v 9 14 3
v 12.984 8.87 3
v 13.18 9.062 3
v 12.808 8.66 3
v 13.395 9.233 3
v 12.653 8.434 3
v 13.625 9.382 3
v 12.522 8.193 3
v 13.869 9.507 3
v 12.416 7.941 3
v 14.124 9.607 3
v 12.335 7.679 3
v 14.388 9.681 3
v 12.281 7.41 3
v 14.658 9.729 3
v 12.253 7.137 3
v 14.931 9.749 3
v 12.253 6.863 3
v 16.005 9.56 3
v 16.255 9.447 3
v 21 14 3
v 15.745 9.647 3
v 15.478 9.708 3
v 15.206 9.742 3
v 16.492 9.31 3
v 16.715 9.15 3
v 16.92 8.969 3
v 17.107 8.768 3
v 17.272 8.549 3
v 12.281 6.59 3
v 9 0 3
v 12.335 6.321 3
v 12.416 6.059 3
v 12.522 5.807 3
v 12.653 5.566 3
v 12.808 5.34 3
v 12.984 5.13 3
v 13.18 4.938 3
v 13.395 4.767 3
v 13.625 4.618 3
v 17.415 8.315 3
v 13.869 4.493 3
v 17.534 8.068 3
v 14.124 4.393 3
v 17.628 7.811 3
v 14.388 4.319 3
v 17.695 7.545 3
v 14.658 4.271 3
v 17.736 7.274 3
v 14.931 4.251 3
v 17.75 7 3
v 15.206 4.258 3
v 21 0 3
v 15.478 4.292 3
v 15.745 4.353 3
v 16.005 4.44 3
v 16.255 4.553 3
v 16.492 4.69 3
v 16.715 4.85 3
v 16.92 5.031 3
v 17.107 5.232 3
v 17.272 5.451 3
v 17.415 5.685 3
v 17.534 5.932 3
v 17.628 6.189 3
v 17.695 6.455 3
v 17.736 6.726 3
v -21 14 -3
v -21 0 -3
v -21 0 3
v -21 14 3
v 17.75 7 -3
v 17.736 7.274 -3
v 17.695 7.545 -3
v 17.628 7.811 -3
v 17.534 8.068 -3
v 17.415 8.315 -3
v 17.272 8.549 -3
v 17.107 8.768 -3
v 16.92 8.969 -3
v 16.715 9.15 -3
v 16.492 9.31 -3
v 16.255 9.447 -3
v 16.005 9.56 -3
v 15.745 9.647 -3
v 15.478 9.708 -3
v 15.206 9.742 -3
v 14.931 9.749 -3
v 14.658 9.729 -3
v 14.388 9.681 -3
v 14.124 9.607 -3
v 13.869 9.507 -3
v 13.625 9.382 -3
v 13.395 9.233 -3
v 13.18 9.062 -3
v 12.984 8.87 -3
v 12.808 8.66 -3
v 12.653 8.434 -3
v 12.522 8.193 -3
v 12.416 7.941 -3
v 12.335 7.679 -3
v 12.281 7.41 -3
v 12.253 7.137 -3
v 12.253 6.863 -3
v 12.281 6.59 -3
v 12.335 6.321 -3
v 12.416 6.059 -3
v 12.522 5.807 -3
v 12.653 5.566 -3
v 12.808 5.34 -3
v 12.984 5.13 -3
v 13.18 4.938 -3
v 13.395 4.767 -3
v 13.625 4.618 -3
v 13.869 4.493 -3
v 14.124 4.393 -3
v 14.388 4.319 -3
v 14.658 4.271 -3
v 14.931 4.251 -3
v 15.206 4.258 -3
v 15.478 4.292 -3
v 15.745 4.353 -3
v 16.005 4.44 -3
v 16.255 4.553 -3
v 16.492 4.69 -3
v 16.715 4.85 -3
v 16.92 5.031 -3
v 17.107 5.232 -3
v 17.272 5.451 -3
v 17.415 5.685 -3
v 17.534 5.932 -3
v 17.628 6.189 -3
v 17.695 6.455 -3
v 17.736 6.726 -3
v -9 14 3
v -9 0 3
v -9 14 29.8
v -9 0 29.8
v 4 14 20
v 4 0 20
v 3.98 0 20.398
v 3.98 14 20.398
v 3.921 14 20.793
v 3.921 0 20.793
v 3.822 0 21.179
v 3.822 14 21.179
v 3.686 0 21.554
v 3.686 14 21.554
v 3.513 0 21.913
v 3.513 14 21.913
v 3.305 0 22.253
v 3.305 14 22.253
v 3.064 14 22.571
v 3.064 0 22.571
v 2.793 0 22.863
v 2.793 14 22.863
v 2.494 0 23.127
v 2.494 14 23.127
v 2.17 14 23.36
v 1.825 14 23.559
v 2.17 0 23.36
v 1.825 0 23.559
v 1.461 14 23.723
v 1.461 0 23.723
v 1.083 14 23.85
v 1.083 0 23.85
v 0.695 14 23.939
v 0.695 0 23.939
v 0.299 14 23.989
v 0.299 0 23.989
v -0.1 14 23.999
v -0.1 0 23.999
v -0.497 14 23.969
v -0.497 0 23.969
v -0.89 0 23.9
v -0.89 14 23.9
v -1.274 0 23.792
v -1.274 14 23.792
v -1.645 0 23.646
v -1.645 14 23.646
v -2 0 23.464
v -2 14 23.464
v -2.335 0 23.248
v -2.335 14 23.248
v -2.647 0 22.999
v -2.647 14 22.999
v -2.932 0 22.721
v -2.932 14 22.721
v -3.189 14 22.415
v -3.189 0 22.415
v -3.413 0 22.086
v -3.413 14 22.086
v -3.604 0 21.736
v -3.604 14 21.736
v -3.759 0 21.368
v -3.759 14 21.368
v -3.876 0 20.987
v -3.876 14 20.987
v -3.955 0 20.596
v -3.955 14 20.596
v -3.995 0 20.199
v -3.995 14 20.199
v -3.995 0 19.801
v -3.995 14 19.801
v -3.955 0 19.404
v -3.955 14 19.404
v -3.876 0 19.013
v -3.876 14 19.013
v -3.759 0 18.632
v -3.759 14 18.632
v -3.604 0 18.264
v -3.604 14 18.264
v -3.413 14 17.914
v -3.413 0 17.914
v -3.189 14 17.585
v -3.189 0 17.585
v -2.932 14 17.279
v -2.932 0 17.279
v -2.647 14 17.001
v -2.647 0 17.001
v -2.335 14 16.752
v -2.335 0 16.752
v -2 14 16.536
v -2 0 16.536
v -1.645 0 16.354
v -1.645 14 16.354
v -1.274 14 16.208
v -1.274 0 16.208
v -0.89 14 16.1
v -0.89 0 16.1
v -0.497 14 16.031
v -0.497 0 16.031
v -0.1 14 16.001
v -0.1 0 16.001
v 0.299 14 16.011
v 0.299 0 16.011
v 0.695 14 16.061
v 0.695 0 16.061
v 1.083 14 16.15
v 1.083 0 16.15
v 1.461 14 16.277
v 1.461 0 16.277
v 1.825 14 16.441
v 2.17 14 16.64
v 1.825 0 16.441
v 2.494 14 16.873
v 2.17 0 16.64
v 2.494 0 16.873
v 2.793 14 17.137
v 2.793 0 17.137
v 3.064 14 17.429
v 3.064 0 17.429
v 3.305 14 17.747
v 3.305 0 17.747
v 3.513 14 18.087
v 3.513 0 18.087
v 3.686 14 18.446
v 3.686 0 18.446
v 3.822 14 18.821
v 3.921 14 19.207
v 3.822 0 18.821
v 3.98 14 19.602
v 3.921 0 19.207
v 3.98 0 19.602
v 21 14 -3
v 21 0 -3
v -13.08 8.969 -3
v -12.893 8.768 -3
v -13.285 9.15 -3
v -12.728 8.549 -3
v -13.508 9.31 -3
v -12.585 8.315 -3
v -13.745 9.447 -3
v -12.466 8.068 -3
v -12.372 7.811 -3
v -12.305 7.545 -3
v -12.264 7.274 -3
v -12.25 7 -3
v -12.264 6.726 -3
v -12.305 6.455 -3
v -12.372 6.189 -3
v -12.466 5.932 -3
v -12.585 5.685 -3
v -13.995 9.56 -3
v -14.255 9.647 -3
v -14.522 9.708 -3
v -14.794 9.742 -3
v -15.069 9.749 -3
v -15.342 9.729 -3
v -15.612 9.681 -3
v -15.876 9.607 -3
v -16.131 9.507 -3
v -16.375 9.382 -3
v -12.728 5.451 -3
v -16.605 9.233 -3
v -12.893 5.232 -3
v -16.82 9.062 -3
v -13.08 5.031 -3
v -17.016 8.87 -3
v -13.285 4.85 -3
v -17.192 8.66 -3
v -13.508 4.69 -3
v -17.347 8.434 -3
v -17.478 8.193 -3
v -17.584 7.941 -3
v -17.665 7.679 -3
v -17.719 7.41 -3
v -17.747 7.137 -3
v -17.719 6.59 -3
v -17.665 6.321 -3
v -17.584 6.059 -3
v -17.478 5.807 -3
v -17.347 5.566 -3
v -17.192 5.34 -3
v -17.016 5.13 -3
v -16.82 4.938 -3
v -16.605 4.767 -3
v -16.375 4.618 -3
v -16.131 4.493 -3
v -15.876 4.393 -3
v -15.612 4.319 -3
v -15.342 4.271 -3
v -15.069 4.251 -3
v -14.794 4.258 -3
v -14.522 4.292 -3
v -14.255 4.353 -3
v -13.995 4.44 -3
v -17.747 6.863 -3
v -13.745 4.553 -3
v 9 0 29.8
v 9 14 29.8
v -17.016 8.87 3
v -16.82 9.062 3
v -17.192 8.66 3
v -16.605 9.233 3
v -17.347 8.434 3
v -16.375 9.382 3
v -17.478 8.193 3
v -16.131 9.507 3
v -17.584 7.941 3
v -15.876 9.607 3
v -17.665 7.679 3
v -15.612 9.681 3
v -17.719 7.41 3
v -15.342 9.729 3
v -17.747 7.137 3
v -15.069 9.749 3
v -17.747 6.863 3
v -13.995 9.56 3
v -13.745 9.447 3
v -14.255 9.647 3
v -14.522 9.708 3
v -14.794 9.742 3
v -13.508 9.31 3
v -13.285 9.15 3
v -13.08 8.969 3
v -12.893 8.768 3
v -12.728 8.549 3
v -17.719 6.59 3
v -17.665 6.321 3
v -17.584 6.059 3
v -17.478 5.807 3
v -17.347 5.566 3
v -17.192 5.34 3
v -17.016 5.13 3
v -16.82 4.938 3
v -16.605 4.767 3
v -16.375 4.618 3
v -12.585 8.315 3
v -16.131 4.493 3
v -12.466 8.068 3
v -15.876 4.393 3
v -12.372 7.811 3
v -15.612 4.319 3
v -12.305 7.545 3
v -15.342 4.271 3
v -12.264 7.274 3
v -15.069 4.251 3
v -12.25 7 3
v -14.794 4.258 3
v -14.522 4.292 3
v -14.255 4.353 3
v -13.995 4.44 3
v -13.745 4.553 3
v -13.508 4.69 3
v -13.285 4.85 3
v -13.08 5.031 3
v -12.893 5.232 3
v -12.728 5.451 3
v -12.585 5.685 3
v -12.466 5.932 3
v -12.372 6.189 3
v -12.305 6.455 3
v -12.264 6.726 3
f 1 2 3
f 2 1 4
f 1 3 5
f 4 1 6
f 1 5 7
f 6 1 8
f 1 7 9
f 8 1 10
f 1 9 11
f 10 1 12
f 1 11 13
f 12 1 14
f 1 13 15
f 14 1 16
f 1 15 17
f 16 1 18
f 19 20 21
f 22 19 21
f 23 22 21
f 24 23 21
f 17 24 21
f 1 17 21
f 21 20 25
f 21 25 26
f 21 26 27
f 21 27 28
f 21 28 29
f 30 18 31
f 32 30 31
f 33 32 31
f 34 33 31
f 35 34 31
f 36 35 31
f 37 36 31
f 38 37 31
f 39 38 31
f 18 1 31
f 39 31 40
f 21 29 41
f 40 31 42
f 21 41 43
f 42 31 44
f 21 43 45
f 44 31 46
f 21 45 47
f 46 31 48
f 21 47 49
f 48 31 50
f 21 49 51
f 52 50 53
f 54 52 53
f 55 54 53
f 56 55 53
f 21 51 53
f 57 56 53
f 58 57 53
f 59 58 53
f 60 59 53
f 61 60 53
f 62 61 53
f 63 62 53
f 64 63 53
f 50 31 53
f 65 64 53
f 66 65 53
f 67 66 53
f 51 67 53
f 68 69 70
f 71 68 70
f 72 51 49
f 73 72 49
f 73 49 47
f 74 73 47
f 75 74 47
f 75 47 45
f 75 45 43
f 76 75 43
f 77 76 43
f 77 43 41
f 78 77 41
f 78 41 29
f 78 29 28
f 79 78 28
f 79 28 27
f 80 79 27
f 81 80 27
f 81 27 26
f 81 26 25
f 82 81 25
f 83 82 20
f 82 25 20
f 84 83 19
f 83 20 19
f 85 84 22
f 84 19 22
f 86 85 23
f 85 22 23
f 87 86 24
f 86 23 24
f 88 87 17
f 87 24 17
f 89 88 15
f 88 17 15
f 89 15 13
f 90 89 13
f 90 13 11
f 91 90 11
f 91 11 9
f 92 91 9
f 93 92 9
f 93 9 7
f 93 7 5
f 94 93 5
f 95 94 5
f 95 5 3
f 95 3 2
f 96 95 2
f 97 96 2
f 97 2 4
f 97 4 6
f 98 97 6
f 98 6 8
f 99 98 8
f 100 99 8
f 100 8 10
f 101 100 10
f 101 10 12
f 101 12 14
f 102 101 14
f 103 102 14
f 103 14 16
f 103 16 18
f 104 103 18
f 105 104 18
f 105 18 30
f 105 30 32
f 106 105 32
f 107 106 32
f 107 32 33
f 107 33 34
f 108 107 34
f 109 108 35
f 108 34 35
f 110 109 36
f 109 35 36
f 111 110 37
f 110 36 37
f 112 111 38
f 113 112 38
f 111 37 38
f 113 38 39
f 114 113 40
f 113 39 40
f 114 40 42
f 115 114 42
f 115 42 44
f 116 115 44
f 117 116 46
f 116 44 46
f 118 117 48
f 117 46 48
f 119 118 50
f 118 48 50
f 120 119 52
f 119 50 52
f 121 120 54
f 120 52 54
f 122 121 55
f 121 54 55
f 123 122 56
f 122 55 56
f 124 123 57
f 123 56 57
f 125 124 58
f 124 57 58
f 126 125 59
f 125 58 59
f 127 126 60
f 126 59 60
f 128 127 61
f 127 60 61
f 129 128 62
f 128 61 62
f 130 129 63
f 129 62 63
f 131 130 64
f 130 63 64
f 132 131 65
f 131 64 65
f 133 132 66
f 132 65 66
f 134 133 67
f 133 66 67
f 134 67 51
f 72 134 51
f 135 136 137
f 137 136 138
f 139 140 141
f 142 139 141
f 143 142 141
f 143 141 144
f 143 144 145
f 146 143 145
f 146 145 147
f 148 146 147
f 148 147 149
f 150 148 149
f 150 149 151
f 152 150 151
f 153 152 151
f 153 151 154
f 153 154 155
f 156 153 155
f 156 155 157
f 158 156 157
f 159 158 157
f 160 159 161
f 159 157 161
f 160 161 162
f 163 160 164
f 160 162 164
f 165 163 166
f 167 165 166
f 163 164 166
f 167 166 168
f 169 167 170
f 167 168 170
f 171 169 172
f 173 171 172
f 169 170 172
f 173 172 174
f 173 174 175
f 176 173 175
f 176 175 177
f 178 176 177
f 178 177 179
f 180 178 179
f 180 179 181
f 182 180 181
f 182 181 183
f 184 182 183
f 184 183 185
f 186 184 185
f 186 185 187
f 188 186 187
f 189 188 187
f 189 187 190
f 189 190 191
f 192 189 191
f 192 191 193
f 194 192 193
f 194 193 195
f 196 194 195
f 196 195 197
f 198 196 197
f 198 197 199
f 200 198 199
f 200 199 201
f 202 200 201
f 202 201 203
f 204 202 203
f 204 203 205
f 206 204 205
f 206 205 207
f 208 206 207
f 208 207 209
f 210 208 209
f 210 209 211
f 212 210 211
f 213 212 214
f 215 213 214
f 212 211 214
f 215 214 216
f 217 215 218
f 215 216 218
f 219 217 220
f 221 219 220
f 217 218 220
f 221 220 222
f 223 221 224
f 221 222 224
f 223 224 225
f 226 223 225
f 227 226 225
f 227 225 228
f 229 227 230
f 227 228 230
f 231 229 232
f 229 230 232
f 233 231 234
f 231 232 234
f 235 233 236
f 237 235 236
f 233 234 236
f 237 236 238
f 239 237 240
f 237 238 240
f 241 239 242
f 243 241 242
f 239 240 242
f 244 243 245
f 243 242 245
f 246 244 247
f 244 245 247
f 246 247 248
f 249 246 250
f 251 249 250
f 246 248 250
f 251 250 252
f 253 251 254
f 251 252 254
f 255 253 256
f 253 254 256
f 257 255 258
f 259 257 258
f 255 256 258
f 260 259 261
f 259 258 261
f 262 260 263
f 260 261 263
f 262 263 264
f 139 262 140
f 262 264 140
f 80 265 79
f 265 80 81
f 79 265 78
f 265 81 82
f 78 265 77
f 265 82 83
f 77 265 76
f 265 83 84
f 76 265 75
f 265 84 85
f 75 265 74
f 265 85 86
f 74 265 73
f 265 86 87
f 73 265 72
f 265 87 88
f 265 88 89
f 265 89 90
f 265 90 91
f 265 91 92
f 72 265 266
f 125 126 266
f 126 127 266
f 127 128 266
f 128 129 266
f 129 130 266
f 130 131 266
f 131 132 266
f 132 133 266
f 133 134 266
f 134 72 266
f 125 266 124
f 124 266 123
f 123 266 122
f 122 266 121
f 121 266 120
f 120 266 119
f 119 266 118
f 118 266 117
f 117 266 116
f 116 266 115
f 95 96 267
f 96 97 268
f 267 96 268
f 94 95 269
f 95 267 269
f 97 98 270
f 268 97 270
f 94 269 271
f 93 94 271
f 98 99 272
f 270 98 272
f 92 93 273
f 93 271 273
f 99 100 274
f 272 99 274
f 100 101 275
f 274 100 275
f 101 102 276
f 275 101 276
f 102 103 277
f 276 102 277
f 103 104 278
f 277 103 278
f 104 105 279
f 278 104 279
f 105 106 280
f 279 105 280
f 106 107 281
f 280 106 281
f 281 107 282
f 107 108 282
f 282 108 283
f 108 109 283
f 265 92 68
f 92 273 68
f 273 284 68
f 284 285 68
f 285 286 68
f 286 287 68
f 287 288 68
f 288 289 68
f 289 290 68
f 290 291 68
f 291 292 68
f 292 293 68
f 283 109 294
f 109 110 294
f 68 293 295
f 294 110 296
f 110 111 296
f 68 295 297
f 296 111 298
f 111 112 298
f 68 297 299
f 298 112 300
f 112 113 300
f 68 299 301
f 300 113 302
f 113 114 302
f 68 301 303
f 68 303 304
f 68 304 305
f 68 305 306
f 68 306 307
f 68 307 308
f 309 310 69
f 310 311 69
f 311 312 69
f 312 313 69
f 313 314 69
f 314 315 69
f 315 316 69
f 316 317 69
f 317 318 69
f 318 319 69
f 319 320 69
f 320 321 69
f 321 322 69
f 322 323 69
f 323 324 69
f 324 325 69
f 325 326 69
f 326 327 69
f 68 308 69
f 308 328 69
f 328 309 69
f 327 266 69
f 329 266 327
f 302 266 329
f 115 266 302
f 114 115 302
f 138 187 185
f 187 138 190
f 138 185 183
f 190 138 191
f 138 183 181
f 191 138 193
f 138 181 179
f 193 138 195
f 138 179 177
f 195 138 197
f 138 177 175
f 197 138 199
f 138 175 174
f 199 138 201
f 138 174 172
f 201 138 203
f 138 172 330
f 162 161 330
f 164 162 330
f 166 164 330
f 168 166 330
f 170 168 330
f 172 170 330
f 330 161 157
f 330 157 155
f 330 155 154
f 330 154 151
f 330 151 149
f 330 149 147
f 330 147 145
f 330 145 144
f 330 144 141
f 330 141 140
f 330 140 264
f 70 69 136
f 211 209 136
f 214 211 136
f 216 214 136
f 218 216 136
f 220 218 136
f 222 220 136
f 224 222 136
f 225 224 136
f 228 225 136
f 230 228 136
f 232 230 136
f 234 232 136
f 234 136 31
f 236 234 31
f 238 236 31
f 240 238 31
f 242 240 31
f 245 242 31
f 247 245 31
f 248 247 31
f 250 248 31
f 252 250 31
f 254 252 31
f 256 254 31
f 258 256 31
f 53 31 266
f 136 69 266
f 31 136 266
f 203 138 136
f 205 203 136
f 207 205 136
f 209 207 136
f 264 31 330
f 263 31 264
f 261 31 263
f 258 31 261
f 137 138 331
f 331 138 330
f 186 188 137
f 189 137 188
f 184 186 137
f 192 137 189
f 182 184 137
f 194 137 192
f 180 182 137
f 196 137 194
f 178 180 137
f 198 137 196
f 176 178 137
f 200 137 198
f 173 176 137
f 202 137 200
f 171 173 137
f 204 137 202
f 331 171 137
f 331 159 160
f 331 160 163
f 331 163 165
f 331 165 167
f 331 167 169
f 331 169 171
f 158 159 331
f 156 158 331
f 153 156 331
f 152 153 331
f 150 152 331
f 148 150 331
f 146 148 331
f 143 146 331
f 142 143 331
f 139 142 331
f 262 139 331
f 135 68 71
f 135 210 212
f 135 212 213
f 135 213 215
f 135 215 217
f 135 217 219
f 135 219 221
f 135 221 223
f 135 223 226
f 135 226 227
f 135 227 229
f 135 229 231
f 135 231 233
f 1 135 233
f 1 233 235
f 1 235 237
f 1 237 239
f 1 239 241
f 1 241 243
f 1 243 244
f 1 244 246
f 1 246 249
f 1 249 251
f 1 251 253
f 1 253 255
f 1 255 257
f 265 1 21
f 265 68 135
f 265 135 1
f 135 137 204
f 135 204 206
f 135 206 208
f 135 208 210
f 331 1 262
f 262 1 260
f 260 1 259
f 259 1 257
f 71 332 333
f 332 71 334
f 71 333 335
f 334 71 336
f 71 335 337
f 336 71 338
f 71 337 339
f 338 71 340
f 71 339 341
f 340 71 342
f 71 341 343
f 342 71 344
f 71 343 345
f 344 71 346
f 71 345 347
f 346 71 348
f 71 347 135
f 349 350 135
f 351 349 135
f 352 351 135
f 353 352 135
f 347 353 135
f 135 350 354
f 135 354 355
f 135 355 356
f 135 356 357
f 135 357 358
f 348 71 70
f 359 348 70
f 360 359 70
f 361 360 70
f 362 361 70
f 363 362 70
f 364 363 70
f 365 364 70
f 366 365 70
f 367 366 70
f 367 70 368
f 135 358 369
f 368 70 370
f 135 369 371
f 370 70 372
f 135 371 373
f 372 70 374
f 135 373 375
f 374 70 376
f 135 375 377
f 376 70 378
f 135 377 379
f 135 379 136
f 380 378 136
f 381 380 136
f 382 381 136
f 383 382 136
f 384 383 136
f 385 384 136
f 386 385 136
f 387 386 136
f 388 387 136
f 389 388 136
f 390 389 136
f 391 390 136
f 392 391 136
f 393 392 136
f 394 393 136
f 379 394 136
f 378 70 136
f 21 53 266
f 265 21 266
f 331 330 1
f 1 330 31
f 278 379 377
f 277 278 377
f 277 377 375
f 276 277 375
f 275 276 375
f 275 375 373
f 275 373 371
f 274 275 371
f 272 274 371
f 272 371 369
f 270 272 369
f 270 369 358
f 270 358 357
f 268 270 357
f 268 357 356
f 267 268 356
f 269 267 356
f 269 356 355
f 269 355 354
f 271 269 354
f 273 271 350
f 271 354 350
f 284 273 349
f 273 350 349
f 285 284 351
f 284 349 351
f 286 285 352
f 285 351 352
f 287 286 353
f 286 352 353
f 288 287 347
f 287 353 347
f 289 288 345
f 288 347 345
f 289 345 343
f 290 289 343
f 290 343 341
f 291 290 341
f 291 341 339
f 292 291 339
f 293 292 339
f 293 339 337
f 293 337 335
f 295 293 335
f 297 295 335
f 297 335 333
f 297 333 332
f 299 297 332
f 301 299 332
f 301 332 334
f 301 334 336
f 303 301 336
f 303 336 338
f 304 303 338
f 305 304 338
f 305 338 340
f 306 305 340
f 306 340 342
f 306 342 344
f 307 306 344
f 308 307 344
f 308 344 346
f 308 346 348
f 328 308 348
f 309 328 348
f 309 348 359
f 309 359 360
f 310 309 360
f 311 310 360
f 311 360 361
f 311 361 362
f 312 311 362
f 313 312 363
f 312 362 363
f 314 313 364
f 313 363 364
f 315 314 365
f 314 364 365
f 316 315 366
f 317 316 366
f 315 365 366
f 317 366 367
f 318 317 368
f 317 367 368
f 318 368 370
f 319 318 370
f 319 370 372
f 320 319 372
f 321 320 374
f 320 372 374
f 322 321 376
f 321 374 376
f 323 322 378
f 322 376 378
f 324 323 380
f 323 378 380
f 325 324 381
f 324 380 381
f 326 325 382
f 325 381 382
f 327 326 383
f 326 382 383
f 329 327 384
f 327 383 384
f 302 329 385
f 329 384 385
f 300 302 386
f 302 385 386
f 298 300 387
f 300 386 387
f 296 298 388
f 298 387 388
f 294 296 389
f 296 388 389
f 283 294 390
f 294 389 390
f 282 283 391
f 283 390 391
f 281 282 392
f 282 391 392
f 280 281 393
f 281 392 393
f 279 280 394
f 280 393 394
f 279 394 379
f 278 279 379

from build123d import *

# Parameters (mm, degrees)
PROFILE_EXTRUDE_DEPTH   = 14
BORE_SKETCH_R           = 4
BORE_CUT_DEPTH          = 15
MOUNTING_HOLE_SKETCH_R  = 2.75
MOUNTING_HOLE_CUT_DEPTH = 7


with BuildPart() as part:
    # Profile Sketch → Profile Extrude (new body)
    with BuildSketch(Plane(origin=(0, 0, 0), x_dir=(1, 0, 0), z_dir=(0, 1, 0))):
        Polygon((9, -3), (21, -3), (21, 3), (-21, 3), (-21, -3), (-9, -3), (-9, -29.8), (9, -29.8), align=None)
    extrude(amount=PROFILE_EXTRUDE_DEPTH)

    # Bore Sketch → Bore Cut (cut, through all)
    with BuildSketch(Plane.XZ):
        with Locations((0, 20)):
            Circle(BORE_SKETCH_R)
    extrude(amount=-BORE_CUT_DEPTH, mode=Mode.SUBTRACT)

    # Mounting Hole Sketch → Mounting Hole Cut (cut, through all)
    with BuildSketch(Plane.XY.offset(3)):
        with Locations((15, 7)):
            Circle(MOUNTING_HOLE_SKETCH_R)
        with Locations((-15, 7)):
            Circle(MOUNTING_HOLE_SKETCH_R)
    extrude(amount=-MOUNTING_HOLE_CUT_DEPTH, mode=Mode.SUBTRACT)


solid = part.part
